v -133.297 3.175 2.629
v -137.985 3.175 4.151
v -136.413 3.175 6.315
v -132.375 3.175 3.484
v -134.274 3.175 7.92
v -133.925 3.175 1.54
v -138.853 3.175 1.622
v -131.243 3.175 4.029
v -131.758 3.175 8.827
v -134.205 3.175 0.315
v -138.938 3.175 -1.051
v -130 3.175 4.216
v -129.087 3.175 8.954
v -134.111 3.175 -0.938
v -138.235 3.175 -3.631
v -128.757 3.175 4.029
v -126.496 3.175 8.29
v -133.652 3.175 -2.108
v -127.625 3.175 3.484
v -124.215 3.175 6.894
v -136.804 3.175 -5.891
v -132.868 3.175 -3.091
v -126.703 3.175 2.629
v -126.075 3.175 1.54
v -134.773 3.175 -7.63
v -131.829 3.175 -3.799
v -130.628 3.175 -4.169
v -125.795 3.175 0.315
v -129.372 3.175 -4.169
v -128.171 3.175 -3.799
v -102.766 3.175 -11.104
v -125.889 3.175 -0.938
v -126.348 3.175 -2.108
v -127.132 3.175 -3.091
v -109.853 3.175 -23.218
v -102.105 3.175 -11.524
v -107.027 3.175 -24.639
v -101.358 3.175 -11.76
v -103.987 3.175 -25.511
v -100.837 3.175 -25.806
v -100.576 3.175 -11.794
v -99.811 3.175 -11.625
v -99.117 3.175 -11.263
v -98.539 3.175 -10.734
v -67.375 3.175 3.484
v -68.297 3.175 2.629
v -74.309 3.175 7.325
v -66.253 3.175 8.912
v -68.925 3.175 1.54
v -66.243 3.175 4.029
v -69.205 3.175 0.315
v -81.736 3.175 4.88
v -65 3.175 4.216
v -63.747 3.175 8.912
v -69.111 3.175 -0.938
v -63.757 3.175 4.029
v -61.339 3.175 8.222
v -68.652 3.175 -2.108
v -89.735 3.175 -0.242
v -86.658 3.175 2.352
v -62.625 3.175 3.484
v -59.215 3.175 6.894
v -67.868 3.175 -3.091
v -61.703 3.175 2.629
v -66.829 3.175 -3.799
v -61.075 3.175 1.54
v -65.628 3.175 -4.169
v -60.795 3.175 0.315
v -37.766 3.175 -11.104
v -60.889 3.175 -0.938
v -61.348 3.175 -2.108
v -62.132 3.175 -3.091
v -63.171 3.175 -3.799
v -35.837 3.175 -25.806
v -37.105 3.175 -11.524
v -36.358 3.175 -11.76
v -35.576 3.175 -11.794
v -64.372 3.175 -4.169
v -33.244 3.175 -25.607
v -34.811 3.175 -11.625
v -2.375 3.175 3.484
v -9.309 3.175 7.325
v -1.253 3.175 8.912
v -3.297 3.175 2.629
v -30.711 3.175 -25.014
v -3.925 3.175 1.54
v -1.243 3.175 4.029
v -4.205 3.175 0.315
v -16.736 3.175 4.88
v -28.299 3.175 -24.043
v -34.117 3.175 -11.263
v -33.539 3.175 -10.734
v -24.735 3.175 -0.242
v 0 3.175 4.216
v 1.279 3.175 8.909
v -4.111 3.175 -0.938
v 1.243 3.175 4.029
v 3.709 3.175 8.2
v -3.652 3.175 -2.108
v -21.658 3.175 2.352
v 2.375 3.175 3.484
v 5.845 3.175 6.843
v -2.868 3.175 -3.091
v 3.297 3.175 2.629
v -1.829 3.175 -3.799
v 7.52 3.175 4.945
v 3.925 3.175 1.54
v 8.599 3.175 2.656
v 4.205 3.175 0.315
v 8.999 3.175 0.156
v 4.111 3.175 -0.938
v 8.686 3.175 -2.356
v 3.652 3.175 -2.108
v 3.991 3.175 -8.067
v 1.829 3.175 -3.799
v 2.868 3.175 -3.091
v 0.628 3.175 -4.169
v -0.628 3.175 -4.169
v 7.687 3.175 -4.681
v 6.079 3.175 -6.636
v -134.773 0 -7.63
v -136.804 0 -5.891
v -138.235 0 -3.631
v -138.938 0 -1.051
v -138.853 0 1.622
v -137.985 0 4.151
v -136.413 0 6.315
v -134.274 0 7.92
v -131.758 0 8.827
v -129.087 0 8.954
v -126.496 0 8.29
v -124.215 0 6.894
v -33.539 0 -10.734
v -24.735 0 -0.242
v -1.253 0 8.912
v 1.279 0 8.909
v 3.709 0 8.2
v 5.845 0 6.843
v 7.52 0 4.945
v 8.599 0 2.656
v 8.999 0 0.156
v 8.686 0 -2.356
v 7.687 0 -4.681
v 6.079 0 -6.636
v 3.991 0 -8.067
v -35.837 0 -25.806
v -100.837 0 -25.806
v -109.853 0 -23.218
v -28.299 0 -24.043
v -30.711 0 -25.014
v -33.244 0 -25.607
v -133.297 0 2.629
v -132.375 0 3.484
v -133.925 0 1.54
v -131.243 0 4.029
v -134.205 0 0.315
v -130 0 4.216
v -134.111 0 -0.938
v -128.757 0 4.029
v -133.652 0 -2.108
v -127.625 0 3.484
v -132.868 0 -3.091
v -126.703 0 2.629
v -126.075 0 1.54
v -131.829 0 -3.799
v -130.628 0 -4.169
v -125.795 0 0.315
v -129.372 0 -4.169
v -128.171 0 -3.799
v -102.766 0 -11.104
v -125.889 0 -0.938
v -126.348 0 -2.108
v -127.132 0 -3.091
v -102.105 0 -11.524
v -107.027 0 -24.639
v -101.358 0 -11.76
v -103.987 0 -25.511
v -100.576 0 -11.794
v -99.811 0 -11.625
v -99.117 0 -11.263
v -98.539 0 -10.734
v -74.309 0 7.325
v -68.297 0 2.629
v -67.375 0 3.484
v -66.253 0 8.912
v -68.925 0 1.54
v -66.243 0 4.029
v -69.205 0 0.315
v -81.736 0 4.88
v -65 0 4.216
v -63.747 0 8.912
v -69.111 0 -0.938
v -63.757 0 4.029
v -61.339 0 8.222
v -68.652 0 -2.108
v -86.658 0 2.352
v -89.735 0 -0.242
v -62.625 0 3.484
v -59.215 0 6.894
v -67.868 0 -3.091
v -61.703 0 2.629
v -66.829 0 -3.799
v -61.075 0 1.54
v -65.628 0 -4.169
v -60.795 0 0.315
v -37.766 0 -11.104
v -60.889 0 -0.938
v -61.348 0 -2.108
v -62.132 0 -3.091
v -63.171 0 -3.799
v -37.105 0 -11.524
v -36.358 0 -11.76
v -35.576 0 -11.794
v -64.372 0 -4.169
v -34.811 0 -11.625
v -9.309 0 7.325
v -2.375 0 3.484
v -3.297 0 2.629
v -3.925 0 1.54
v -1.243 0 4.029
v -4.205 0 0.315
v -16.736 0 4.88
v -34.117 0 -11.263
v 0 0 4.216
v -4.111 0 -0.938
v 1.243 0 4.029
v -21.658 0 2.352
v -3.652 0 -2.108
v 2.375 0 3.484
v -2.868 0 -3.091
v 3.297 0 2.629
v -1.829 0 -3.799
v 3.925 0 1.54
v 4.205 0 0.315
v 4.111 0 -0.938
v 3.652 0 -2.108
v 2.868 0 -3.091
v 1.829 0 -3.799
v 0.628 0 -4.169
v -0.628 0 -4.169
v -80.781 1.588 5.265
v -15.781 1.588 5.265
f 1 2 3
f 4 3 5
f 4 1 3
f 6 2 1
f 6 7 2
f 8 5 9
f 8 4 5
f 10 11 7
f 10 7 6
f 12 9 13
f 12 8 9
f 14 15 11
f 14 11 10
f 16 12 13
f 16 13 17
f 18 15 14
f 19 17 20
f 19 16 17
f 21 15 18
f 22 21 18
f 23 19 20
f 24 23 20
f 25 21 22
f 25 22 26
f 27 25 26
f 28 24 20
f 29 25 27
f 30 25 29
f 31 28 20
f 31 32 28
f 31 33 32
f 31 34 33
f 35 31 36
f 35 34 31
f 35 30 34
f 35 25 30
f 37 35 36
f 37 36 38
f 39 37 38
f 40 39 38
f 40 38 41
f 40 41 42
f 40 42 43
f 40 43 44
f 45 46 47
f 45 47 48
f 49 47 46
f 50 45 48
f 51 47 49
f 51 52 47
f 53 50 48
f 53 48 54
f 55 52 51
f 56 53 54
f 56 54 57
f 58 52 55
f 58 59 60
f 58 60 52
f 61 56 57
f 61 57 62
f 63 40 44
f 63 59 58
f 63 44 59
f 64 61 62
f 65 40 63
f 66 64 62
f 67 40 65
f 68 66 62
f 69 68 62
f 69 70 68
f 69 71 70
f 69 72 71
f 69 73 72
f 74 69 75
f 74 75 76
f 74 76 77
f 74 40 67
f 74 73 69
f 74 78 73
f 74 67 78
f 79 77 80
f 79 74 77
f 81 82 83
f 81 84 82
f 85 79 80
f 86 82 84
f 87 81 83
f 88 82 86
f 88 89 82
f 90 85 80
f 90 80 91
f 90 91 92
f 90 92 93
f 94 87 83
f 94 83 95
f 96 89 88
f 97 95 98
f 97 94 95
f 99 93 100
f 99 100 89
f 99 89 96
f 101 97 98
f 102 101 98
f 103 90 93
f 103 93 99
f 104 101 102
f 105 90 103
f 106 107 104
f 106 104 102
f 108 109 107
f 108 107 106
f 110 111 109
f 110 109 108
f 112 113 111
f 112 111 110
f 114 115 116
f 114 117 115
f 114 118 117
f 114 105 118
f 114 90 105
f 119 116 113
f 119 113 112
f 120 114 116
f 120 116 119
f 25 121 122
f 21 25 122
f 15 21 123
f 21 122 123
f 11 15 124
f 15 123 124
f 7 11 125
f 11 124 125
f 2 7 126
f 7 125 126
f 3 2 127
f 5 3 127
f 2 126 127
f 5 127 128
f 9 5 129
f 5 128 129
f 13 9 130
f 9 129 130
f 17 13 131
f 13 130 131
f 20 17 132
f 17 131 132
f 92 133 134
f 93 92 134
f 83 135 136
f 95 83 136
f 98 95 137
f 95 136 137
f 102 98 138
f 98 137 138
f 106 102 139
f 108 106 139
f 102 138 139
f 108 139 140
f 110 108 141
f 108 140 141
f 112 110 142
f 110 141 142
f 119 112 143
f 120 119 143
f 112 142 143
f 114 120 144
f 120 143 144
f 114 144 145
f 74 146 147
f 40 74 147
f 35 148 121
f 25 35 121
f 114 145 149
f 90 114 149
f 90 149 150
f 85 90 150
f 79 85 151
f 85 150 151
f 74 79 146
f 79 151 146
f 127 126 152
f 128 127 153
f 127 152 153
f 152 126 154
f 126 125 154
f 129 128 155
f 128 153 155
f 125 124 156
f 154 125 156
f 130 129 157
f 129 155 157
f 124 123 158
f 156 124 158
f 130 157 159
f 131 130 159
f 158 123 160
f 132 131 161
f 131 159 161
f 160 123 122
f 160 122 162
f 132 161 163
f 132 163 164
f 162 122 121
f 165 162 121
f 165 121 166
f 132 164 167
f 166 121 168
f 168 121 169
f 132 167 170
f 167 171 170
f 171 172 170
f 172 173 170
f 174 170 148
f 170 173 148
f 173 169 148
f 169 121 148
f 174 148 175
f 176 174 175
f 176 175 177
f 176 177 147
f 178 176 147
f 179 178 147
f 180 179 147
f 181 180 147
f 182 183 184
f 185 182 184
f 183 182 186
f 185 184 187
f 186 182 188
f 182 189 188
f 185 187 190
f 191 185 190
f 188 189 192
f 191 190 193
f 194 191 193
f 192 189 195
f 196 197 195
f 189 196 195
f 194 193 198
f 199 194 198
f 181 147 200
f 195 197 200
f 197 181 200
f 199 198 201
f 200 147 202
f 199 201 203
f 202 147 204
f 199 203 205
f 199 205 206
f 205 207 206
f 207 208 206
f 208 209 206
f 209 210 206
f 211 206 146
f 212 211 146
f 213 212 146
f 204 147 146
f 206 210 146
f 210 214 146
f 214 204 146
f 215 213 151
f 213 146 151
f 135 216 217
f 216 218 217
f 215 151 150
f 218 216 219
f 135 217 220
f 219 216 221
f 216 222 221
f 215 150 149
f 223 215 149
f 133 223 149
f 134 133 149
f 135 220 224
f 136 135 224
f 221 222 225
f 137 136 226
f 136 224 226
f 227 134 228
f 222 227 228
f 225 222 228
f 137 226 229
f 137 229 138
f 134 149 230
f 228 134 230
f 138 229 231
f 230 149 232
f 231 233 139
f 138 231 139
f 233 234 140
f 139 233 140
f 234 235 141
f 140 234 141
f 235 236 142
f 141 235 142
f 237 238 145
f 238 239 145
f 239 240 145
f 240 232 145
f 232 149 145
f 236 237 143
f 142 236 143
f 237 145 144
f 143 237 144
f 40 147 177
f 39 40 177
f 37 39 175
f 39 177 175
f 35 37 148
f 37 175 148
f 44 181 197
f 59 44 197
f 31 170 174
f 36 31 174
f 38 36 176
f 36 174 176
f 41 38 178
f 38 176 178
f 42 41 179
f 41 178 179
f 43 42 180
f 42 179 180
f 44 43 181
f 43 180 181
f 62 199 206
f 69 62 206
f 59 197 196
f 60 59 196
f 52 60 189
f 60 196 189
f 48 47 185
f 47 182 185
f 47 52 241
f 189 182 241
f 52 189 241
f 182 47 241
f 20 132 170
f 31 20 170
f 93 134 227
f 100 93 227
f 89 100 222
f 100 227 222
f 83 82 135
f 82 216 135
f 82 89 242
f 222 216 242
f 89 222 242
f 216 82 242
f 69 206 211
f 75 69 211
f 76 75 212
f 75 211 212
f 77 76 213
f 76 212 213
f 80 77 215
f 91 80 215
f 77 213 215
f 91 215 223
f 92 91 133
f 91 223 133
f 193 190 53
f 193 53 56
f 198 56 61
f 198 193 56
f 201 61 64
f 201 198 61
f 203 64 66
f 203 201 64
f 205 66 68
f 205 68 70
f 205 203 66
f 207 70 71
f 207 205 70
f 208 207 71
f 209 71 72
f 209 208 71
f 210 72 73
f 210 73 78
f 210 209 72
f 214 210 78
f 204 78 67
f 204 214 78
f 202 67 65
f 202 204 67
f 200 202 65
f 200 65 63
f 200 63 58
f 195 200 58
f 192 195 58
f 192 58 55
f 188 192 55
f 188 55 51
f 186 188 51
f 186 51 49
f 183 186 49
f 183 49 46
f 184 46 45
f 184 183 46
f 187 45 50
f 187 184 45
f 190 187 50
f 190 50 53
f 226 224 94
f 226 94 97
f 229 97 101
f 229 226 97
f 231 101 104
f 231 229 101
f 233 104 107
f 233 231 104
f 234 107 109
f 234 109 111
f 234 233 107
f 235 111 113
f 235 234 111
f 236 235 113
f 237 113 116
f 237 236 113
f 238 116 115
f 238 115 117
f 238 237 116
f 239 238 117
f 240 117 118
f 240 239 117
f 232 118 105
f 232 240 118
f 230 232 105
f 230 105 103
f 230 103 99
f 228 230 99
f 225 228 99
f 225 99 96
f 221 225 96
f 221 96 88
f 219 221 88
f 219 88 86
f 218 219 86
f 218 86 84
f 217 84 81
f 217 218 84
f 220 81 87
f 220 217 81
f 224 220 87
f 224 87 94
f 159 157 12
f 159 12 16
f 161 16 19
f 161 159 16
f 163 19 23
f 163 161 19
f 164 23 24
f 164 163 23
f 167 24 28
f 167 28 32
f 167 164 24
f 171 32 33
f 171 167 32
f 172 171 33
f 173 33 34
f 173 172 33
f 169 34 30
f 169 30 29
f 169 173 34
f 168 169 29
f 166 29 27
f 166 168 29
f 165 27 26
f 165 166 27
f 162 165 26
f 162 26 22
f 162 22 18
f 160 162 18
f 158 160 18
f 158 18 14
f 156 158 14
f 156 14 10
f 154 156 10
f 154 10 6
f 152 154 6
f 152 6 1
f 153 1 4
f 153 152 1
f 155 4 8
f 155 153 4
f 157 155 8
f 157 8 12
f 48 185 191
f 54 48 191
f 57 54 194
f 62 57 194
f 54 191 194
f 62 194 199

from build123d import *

# Parameters (mm, degrees)
SKETCH1_R           = 4.2164
BOSS_EXTRUDE1_DEPTH = 3.175


with BuildPart() as part:
    # Sketch1 → Boss-Extrude1 (new body)
    with BuildSketch(Plane(origin=(0, 0, 0), x_dir=(1, 0, 0), z_dir=(0, 1, 0))):
        with BuildLine():
            Line((-59.214911513, -6.894399988), (-37.765667105, 11.103653083))
            ThreePointArc((-37.765667105, 11.103653083), (-35.575837048, 11.794103848), (-33.539170947, 10.733882583))
            Line((-33.539170947, 10.733882583), (-24.735247395, 0.241775061))
            add(Edge.make_bspline(
                [(-24.735247395, 0.241775061), (-19.166526074, -6.39476858), (-1.252557909, -8.912412619)],
                knots=[0.363872068, 0.363872068, 0.363872068, 1.570796327, 1.570796327, 1.570796327], degree=2, weights=[1, 0.823375807, 1]))
            ThreePointArc((-1.252557909, -8.912412619), (8.599251475, -2.655724773), (3.991123209, 8.066655784))
            Line((3.991123209, 8.066655784), (-28.298515993, 24.042536234))
            ThreePointArc((-28.298515993, 24.042536234), (-31.966211418, 25.358907325), (-35.837304276, 25.805519754))
            Line((-35.837304276, 25.805519754), (-100.837304276, 25.805519754))
            ThreePointArc((-100.837304276, 25.805519754), (-105.526927742, 25.145881798), (-109.852615487, 23.218158783))
            Line((-109.852615487, 23.218158783), (-134.772811817, 7.630220662))
            ThreePointArc((-134.772811817, 7.630220662), (-137.279926323, -5.291755165), (-124.214911513, -6.894399988))
            Line((-124.214911513, -6.894399988), (-102.765667105, 11.103653083))
            ThreePointArc((-102.765667105, 11.103653083), (-100.575837048, 11.794103848), (-98.539170947, 10.733882583))
            Line((-98.539170947, 10.733882583), (-89.735247395, 0.241775061))
            add(Edge.make_bspline(
                [(-89.735247395, 0.241775061), (-84.166526074, -6.39476858), (-66.252557909, -8.912412619)],
                knots=[0.363872068, 0.363872068, 0.363872068, 1.570796327, 1.570796327, 1.570796327], degree=2, weights=[1, 0.823375807, 1]))
            ThreePointArc((-66.252557909, -8.912412619), (-62.519263798, -8.651355263), (-59.214911513, -6.894399988))
        make_face()
        with Locations(Location((0, 0, 0), (0, 0, 270))):
            Circle(SKETCH1_R, mode=Mode.SUBTRACT)
        with Locations(Location((-65, 0, 0), (0, 0, 270))):
            Circle(SKETCH1_R, mode=Mode.SUBTRACT)
        with Locations(Location((-130, 0, 0), (0, 0, 270))):
            Circle(SKETCH1_R, mode=Mode.SUBTRACT)
    extrude(amount=BOSS_EXTRUDE1_DEPTH)


solid = part.part
